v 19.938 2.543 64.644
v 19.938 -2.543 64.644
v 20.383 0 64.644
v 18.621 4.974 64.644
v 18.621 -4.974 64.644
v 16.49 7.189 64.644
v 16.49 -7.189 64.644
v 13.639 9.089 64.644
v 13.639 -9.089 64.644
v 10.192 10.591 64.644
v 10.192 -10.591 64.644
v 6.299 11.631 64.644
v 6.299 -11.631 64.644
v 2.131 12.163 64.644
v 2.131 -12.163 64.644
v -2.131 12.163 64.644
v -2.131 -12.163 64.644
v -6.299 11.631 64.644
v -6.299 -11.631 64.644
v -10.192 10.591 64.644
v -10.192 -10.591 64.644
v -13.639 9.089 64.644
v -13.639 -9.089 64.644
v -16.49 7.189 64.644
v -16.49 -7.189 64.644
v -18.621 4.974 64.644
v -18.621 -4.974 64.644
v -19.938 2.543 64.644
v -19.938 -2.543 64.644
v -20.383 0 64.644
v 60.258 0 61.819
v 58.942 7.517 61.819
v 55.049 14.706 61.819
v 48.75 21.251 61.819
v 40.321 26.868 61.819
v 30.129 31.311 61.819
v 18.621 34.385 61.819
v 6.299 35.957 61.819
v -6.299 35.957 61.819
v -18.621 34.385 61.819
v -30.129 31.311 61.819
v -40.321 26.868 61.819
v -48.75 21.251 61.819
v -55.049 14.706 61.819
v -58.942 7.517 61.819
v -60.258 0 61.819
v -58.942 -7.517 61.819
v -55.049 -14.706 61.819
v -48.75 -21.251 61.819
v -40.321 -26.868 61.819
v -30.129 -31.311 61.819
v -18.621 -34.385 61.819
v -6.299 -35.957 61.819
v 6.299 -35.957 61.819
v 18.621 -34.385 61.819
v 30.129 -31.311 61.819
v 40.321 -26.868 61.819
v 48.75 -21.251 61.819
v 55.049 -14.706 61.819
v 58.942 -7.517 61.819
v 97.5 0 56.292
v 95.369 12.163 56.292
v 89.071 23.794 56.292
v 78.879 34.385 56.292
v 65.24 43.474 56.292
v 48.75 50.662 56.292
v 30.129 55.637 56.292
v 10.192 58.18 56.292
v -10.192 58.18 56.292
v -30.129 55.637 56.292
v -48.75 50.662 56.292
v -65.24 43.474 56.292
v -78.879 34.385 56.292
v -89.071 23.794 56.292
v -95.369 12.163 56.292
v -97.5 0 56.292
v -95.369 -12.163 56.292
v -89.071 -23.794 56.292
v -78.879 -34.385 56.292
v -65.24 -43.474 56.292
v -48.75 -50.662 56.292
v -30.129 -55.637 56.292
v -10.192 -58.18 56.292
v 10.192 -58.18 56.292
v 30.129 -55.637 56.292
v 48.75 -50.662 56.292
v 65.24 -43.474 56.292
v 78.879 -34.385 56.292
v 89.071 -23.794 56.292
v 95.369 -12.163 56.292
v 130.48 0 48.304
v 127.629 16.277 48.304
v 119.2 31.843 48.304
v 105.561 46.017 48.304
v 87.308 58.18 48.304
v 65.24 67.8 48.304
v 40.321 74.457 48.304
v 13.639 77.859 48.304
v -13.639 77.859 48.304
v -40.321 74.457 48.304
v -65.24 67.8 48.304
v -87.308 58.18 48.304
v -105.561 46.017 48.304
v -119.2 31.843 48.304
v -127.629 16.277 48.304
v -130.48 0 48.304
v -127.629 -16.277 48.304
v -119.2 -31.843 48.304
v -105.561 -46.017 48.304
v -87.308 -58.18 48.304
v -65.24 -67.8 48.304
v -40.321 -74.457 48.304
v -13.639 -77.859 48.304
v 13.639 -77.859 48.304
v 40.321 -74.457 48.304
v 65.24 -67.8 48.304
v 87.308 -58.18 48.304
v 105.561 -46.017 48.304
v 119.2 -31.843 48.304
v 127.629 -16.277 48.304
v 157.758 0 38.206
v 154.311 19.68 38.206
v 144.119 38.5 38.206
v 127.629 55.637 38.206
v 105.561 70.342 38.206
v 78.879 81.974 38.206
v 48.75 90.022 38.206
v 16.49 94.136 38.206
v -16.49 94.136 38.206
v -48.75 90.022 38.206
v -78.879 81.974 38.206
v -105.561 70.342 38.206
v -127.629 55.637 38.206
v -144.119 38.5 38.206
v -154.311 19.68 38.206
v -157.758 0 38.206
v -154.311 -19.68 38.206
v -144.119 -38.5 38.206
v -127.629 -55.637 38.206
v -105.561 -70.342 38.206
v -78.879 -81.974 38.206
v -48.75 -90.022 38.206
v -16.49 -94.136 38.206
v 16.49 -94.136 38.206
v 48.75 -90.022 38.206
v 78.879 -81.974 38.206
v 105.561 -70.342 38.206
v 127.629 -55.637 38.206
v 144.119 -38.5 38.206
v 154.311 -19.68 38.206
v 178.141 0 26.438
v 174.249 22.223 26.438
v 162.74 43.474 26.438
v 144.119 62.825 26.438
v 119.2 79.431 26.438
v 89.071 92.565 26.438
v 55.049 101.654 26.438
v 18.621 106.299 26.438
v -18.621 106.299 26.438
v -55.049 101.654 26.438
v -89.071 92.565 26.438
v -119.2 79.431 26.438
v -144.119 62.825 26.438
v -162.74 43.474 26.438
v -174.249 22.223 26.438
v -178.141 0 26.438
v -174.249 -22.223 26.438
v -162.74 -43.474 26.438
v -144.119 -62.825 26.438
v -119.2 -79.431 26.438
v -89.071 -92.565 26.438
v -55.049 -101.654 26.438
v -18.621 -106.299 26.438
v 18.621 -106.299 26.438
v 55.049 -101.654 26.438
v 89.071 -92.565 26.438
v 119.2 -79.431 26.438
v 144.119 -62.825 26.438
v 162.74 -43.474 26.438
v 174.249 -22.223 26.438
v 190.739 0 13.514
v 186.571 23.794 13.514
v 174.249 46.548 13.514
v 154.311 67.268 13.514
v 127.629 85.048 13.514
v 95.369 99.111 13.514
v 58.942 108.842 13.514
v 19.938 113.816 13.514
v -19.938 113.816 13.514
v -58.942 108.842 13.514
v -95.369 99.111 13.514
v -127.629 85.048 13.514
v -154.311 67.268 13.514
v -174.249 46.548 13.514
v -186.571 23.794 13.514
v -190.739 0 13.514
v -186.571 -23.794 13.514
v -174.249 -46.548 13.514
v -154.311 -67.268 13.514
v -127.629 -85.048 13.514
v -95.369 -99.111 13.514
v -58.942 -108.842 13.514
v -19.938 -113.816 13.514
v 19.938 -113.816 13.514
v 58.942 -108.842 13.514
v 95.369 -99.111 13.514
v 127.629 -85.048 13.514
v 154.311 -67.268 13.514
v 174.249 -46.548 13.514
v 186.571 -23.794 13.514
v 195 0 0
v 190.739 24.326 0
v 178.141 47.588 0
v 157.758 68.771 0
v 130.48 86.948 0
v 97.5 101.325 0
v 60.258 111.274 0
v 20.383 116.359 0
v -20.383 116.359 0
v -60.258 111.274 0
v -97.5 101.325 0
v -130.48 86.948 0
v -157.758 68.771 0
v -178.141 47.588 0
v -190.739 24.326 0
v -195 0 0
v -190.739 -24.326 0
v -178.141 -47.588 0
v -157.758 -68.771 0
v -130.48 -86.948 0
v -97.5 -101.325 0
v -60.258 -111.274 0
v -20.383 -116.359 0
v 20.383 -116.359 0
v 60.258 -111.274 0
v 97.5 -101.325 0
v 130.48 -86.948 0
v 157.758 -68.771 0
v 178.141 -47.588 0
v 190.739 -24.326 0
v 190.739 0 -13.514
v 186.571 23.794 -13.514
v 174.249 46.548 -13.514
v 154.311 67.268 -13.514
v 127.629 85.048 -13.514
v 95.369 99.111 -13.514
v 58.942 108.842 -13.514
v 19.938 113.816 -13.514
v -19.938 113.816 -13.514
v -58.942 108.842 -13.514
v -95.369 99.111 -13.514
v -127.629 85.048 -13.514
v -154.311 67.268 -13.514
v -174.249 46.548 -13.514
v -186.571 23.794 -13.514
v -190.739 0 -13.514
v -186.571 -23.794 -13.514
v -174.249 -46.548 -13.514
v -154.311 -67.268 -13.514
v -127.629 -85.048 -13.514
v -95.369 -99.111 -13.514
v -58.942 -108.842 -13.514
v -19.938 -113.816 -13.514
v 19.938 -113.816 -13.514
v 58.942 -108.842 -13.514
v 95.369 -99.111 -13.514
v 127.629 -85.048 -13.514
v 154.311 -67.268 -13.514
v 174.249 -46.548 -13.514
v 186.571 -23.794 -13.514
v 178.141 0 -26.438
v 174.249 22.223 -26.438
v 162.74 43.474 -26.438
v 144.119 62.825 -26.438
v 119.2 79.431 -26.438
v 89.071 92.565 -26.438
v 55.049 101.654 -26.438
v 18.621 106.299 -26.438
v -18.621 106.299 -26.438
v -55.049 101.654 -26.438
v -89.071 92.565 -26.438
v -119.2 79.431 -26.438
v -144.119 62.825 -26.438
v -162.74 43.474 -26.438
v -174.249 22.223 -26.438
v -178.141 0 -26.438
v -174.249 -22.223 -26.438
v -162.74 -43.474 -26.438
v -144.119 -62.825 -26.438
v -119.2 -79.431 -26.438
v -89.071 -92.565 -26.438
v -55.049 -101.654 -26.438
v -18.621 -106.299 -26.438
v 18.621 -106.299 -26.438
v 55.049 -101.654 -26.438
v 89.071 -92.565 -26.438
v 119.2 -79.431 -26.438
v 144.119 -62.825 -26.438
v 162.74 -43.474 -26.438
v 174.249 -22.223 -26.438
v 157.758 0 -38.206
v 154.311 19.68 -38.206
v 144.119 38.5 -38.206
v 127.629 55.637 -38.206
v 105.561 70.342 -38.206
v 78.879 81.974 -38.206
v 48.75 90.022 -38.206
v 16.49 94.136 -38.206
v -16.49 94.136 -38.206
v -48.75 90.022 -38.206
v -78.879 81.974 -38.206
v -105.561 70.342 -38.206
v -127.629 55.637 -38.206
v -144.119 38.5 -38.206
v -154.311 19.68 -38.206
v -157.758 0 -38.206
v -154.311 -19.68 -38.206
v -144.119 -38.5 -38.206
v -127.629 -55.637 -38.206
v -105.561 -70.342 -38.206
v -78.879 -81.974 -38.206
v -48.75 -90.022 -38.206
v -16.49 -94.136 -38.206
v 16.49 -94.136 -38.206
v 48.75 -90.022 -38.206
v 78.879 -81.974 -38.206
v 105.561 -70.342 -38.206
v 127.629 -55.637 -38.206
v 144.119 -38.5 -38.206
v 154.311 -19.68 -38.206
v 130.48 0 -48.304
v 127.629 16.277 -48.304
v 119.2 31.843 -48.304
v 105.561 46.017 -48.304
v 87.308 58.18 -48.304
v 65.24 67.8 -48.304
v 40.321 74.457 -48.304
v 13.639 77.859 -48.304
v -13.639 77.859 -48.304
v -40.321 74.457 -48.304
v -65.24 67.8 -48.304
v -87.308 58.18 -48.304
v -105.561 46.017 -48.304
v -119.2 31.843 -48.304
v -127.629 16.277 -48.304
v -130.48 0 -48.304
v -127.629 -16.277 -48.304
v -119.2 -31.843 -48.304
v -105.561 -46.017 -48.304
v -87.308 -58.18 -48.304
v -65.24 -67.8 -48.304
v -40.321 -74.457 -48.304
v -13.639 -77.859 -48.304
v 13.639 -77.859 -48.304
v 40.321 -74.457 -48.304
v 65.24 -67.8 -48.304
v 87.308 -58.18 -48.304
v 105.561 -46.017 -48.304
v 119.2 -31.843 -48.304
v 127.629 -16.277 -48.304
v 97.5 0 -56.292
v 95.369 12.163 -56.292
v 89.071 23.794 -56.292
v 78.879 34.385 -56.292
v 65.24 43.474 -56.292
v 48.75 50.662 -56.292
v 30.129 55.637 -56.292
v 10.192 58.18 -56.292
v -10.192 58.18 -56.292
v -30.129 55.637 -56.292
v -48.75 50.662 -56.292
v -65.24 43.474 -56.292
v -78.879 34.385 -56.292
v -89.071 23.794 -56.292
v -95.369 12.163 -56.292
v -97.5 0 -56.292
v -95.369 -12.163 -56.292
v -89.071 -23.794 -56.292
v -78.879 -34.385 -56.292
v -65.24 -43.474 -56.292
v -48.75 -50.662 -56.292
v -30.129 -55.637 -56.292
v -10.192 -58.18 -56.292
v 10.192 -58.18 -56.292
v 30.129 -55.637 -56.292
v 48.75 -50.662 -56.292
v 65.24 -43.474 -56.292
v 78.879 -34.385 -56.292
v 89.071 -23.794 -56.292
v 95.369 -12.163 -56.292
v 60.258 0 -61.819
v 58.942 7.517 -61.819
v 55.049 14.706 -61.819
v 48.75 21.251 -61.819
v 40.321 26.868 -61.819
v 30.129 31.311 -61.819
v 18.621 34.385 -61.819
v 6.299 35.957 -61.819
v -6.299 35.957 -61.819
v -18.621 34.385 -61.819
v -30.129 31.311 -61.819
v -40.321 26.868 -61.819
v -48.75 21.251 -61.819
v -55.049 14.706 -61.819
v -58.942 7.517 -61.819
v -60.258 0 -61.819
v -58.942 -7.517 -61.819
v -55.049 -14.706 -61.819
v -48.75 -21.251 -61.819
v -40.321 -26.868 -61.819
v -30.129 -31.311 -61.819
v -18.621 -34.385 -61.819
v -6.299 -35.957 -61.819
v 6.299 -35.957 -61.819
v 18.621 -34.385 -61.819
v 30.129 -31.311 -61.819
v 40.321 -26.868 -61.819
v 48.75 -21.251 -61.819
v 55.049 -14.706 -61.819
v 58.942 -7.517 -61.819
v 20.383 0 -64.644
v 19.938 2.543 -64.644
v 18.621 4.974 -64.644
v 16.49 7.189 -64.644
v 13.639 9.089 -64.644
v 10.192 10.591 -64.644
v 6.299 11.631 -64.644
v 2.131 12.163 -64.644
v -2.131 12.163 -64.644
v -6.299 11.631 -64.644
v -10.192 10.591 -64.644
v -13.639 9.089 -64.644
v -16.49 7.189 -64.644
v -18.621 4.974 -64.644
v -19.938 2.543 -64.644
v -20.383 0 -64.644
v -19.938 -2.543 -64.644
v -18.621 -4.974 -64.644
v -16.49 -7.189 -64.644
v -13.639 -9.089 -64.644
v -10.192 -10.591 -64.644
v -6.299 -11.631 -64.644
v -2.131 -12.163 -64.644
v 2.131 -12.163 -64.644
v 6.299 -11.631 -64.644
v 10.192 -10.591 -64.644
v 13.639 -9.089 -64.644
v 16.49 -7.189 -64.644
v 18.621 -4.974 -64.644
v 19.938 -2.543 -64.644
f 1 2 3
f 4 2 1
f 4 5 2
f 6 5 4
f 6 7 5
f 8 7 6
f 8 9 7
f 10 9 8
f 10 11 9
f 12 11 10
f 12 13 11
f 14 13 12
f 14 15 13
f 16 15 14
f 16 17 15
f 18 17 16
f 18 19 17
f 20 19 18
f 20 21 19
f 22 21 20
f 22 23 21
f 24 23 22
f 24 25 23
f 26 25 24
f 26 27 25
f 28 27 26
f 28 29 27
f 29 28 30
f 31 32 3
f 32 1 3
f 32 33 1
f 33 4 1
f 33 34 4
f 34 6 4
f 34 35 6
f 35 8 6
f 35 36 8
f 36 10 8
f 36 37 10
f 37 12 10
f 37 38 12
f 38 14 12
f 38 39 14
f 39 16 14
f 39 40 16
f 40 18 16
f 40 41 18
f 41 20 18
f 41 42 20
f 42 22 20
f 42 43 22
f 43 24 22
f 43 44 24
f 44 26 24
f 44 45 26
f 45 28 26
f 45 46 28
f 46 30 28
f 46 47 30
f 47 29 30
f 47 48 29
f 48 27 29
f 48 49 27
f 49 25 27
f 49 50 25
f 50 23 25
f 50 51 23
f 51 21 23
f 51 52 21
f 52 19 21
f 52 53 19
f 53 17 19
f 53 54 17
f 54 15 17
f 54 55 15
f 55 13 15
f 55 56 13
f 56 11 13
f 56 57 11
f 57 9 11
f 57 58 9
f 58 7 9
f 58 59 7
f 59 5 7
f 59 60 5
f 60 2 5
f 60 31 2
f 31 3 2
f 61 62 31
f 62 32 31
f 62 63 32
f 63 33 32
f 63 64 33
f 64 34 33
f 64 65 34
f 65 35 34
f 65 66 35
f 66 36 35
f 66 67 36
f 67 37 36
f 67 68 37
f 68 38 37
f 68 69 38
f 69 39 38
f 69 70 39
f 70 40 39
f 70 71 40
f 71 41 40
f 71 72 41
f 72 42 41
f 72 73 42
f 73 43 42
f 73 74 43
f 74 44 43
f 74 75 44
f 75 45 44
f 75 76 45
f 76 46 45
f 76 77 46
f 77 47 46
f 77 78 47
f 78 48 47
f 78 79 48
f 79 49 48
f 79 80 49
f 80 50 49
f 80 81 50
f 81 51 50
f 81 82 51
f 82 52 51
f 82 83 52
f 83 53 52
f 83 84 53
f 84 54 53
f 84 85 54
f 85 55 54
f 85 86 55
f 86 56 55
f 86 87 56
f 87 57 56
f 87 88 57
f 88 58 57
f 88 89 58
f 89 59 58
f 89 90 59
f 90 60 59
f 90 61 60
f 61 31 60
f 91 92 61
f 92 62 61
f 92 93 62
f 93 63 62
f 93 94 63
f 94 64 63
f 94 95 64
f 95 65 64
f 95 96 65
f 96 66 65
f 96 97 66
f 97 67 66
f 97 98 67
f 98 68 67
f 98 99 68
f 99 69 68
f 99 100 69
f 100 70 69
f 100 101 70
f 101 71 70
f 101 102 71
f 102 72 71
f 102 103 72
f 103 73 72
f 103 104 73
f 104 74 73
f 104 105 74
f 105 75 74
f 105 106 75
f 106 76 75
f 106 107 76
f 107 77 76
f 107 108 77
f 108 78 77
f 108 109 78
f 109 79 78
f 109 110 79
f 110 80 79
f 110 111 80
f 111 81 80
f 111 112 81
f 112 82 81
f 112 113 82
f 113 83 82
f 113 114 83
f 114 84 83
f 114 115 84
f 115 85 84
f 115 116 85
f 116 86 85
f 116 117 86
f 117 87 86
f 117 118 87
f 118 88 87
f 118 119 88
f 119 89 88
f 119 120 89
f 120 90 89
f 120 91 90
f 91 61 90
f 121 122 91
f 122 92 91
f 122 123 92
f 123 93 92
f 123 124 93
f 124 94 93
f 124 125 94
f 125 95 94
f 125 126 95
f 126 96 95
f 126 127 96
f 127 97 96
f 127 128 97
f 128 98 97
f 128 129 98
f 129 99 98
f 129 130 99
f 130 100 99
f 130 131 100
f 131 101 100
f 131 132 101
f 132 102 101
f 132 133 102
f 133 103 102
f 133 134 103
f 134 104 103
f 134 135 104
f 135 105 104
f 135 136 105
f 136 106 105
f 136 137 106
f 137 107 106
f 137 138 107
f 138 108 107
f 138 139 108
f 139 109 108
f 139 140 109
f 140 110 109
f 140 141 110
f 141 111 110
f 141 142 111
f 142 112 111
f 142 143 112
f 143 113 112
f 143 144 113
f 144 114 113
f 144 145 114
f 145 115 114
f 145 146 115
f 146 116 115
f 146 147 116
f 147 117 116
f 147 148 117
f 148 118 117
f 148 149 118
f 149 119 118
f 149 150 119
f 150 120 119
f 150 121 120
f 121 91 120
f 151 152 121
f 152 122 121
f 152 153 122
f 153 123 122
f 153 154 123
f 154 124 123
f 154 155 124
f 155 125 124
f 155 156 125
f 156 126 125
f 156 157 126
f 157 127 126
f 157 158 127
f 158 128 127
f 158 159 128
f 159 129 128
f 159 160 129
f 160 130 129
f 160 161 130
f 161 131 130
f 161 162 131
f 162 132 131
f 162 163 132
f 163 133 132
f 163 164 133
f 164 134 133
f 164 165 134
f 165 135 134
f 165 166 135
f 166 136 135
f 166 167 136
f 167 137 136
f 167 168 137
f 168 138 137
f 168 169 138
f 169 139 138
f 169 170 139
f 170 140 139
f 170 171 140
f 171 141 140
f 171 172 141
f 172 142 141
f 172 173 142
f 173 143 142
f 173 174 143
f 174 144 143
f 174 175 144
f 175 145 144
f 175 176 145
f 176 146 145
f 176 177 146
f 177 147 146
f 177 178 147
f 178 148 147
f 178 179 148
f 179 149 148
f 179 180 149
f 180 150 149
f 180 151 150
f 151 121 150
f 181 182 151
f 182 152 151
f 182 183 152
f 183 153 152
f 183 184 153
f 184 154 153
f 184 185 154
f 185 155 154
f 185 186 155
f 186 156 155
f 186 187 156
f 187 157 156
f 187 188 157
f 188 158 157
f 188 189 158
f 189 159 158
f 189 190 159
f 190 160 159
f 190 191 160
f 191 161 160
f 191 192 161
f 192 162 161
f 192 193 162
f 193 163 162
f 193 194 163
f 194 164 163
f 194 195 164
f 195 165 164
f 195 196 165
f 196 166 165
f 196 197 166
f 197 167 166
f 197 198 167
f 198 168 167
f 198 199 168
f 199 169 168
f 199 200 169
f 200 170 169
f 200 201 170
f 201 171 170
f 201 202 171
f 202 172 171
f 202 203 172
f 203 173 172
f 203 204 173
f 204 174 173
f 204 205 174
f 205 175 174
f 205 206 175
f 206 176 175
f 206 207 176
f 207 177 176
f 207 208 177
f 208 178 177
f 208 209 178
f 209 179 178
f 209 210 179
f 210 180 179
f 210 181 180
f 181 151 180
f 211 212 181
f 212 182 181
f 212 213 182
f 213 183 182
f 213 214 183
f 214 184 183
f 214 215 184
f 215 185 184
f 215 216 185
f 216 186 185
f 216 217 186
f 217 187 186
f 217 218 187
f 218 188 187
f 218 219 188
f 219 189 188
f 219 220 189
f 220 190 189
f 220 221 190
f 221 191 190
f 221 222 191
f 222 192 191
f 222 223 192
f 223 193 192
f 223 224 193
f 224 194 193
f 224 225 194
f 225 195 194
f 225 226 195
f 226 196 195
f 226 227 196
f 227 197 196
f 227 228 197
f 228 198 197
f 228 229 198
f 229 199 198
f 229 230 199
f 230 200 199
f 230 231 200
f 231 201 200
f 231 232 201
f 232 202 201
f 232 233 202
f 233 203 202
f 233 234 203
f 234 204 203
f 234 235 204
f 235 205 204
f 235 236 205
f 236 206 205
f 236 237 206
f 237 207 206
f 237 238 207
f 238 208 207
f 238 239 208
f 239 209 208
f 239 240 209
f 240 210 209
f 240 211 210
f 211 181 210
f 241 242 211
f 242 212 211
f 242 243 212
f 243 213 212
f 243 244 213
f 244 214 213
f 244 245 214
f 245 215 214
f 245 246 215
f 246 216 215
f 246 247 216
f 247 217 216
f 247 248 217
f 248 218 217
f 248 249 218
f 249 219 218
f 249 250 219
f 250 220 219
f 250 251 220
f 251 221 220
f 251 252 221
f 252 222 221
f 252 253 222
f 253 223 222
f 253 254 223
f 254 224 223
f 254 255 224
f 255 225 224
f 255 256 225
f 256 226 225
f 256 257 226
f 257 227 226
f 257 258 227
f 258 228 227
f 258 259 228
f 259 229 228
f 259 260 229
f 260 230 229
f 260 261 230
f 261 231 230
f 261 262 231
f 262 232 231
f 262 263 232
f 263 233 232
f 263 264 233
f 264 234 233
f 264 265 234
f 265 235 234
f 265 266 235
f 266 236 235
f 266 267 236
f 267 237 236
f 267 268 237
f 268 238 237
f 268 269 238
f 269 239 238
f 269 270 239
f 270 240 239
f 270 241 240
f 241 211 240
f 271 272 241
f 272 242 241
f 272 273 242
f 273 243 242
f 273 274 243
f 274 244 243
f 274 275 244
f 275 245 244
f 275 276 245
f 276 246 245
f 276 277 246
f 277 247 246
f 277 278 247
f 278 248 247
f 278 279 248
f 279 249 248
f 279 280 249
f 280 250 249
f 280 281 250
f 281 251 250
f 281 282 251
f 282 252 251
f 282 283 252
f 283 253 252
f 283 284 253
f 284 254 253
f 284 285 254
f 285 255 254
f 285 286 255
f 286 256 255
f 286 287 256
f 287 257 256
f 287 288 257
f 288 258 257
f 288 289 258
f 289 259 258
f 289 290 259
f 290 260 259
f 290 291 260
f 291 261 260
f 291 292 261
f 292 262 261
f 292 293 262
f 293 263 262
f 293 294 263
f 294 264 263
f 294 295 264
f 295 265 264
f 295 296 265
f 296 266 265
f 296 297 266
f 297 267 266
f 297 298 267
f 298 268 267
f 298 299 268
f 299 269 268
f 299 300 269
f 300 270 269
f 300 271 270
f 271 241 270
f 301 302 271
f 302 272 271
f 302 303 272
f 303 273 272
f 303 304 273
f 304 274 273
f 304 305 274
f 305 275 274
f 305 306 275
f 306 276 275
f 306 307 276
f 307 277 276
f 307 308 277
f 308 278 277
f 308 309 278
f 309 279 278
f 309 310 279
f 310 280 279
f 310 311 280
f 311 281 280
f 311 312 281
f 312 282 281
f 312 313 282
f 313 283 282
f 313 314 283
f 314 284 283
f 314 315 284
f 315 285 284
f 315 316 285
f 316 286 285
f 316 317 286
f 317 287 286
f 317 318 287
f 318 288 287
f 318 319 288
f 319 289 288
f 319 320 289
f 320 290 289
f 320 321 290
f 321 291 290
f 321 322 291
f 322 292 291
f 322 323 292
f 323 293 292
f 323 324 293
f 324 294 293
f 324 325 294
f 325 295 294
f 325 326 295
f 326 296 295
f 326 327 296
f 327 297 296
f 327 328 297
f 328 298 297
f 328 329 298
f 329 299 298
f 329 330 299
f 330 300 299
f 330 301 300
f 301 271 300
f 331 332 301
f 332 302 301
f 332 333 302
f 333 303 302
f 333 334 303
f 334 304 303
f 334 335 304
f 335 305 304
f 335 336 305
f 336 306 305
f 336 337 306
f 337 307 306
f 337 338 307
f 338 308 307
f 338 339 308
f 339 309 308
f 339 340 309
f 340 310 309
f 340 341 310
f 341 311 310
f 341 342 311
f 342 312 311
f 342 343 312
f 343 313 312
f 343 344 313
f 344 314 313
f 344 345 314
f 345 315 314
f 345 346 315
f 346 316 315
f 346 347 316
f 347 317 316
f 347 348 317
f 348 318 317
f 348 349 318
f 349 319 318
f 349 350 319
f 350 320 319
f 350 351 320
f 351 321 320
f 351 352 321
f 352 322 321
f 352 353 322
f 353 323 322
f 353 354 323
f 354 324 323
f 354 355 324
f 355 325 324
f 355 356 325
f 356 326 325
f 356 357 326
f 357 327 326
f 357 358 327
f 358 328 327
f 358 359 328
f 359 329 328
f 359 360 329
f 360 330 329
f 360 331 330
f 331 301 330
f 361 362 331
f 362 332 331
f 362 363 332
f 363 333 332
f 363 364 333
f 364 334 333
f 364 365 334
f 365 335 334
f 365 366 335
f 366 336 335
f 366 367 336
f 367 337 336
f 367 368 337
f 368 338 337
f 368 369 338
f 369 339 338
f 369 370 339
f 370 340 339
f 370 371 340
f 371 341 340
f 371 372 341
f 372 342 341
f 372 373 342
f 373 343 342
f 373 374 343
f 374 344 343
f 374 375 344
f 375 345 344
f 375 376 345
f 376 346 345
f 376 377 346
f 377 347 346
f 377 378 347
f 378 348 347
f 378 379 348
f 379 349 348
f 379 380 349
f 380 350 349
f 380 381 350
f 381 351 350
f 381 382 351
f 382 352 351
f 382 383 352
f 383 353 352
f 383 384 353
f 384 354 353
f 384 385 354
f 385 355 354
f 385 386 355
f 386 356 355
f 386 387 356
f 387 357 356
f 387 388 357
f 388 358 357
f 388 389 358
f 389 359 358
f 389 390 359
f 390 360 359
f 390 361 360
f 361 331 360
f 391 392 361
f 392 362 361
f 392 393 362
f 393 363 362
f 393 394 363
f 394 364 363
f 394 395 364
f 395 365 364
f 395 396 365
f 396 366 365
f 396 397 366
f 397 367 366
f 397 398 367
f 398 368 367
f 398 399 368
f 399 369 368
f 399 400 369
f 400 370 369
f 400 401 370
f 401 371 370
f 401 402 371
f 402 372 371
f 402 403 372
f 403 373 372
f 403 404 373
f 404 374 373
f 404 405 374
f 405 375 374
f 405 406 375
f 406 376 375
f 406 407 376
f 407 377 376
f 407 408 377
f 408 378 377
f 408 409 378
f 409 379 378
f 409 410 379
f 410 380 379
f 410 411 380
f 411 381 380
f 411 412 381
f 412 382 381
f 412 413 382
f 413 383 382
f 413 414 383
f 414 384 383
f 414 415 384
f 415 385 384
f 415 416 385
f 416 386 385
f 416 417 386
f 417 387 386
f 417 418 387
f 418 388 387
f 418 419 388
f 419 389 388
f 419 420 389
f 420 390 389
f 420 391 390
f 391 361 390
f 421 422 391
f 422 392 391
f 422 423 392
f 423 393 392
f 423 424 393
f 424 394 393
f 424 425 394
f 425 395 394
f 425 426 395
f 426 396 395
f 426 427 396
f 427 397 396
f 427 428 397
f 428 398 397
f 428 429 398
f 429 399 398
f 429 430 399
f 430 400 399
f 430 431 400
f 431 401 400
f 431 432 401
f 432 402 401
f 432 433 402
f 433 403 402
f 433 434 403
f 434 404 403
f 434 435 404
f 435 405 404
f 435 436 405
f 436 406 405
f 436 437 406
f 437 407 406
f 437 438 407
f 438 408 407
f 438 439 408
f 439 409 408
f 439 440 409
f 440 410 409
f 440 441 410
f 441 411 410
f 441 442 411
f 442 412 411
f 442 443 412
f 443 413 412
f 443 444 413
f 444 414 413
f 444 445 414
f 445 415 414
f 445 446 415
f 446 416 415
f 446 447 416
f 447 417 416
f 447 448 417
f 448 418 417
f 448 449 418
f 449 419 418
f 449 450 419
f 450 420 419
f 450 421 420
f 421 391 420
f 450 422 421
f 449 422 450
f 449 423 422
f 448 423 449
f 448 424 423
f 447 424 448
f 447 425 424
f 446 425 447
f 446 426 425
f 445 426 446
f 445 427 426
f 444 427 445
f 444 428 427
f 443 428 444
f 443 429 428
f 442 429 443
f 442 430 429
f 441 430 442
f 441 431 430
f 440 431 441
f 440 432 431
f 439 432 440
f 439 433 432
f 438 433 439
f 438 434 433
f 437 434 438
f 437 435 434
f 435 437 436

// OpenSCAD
// Generated by SolidPython 1.0.1 on 2020-07-29 00:46:51


scale(v = [15, 9, 5]) {
	sphere(r = 13);
}
/***********************************************
*********      SolidPython code:      **********
************************************************
 
# import packages: SolidPython
from solid import *
from solid.utils import *
from itertools import chain, combinations, permutations


class Resize:

    def __init__(self, scad_file):
        self.scad_file = scad_file
        #self.scad_file = import_scad(scad_file)
        # cone/cylinder param:
        self.r1 = 0
        self.r2 = 0
        self.h = 0
        # rectangular prism param:
        self.w = 0
        self.l = 0
        # ellipse param:
        self.r = 0

    # import OpenScad code (file name corresponds to shape)


    # classify shape + parameters
    def assign(self, param1, param2, param3):
        if self.scad_file == 'cone.scad':
            self.r1 = param1
            self.r2 = param2
            self.h = param3
        elif self.scad_file == 'cylinder.scad':
            self.r1 = param1
            self.r2 = param2
            self.h = param3
        elif self.scad_file == 'rectangularPrism.scad':
            self.h = param1
            self.l = param2
            self.w = param3
        else:
            self.r = param1
            self.h = param2

    # resize parameters
    def iterate(self):
        x = range(3, 20, 2)
        i = 1
        if self.scad_file == 'cone.scad':
            tempList = list(permutations(x, 2))
            for temp in tempList:
                param1 = temp[0]
                param2 = temp[1]
                filepath = 'produced_scad_files/' + 'cone' + str(param1) + '_' + str(param2) + '_' + '.scad'
                scad_render_to_file(cylinder(h=param1, r1=param2, r2=0), filepath)

        elif self.scad_file == 'cylinder.scad':
            tempList = list(permutations(x, 3))
            for temp in tempList:
                param1 = temp[0]
                param2 = temp[1]
                filepath = 'produced_scad_files/' + 'cylinder' + str(param1) + '_' + str(param2) + '_' + '.scad'
                scad_render_to_file(cylinder(h=param1, r1=param2, r2=param2), filepath)

        elif self.scad_file == 'rectangularPrism.scad':
            tempList = list(permutations(x, 3))
            for temp in tempList:
                param1 = temp[0]
                param2 = temp[1]
                param3 = temp[2]
                filepath = 'produced_scad_files/' + 'rectangularPrism' + str(param1) + '_' + str(param2) + '_' + str(
                    param3) + '.scad'
                scad_render_to_file(cube(size=(param1, param2, param3)), filepath)

        elif self.scad_file == 'ellipse.scad':
            tempList = list(permutations(x, 4))
            for temp in tempList:
                param1 = temp[0]
                param2 = temp[1]
                param3 = temp[2]
                param4 = temp[3]
                filepath = 'produced_scad_files/' + 'ellipse' + str(param1) + '_' + str(param2) + '_' + str(param3) + '_' + str(param4) + '.scad'
                scad_render_to_file(scale([param1, param2, param3])(sphere(r=param4)), filepath)

    def render_to_scadfile(self):
        scad_render_to_file(scad, 'example.scad') 
 
************************************************/
